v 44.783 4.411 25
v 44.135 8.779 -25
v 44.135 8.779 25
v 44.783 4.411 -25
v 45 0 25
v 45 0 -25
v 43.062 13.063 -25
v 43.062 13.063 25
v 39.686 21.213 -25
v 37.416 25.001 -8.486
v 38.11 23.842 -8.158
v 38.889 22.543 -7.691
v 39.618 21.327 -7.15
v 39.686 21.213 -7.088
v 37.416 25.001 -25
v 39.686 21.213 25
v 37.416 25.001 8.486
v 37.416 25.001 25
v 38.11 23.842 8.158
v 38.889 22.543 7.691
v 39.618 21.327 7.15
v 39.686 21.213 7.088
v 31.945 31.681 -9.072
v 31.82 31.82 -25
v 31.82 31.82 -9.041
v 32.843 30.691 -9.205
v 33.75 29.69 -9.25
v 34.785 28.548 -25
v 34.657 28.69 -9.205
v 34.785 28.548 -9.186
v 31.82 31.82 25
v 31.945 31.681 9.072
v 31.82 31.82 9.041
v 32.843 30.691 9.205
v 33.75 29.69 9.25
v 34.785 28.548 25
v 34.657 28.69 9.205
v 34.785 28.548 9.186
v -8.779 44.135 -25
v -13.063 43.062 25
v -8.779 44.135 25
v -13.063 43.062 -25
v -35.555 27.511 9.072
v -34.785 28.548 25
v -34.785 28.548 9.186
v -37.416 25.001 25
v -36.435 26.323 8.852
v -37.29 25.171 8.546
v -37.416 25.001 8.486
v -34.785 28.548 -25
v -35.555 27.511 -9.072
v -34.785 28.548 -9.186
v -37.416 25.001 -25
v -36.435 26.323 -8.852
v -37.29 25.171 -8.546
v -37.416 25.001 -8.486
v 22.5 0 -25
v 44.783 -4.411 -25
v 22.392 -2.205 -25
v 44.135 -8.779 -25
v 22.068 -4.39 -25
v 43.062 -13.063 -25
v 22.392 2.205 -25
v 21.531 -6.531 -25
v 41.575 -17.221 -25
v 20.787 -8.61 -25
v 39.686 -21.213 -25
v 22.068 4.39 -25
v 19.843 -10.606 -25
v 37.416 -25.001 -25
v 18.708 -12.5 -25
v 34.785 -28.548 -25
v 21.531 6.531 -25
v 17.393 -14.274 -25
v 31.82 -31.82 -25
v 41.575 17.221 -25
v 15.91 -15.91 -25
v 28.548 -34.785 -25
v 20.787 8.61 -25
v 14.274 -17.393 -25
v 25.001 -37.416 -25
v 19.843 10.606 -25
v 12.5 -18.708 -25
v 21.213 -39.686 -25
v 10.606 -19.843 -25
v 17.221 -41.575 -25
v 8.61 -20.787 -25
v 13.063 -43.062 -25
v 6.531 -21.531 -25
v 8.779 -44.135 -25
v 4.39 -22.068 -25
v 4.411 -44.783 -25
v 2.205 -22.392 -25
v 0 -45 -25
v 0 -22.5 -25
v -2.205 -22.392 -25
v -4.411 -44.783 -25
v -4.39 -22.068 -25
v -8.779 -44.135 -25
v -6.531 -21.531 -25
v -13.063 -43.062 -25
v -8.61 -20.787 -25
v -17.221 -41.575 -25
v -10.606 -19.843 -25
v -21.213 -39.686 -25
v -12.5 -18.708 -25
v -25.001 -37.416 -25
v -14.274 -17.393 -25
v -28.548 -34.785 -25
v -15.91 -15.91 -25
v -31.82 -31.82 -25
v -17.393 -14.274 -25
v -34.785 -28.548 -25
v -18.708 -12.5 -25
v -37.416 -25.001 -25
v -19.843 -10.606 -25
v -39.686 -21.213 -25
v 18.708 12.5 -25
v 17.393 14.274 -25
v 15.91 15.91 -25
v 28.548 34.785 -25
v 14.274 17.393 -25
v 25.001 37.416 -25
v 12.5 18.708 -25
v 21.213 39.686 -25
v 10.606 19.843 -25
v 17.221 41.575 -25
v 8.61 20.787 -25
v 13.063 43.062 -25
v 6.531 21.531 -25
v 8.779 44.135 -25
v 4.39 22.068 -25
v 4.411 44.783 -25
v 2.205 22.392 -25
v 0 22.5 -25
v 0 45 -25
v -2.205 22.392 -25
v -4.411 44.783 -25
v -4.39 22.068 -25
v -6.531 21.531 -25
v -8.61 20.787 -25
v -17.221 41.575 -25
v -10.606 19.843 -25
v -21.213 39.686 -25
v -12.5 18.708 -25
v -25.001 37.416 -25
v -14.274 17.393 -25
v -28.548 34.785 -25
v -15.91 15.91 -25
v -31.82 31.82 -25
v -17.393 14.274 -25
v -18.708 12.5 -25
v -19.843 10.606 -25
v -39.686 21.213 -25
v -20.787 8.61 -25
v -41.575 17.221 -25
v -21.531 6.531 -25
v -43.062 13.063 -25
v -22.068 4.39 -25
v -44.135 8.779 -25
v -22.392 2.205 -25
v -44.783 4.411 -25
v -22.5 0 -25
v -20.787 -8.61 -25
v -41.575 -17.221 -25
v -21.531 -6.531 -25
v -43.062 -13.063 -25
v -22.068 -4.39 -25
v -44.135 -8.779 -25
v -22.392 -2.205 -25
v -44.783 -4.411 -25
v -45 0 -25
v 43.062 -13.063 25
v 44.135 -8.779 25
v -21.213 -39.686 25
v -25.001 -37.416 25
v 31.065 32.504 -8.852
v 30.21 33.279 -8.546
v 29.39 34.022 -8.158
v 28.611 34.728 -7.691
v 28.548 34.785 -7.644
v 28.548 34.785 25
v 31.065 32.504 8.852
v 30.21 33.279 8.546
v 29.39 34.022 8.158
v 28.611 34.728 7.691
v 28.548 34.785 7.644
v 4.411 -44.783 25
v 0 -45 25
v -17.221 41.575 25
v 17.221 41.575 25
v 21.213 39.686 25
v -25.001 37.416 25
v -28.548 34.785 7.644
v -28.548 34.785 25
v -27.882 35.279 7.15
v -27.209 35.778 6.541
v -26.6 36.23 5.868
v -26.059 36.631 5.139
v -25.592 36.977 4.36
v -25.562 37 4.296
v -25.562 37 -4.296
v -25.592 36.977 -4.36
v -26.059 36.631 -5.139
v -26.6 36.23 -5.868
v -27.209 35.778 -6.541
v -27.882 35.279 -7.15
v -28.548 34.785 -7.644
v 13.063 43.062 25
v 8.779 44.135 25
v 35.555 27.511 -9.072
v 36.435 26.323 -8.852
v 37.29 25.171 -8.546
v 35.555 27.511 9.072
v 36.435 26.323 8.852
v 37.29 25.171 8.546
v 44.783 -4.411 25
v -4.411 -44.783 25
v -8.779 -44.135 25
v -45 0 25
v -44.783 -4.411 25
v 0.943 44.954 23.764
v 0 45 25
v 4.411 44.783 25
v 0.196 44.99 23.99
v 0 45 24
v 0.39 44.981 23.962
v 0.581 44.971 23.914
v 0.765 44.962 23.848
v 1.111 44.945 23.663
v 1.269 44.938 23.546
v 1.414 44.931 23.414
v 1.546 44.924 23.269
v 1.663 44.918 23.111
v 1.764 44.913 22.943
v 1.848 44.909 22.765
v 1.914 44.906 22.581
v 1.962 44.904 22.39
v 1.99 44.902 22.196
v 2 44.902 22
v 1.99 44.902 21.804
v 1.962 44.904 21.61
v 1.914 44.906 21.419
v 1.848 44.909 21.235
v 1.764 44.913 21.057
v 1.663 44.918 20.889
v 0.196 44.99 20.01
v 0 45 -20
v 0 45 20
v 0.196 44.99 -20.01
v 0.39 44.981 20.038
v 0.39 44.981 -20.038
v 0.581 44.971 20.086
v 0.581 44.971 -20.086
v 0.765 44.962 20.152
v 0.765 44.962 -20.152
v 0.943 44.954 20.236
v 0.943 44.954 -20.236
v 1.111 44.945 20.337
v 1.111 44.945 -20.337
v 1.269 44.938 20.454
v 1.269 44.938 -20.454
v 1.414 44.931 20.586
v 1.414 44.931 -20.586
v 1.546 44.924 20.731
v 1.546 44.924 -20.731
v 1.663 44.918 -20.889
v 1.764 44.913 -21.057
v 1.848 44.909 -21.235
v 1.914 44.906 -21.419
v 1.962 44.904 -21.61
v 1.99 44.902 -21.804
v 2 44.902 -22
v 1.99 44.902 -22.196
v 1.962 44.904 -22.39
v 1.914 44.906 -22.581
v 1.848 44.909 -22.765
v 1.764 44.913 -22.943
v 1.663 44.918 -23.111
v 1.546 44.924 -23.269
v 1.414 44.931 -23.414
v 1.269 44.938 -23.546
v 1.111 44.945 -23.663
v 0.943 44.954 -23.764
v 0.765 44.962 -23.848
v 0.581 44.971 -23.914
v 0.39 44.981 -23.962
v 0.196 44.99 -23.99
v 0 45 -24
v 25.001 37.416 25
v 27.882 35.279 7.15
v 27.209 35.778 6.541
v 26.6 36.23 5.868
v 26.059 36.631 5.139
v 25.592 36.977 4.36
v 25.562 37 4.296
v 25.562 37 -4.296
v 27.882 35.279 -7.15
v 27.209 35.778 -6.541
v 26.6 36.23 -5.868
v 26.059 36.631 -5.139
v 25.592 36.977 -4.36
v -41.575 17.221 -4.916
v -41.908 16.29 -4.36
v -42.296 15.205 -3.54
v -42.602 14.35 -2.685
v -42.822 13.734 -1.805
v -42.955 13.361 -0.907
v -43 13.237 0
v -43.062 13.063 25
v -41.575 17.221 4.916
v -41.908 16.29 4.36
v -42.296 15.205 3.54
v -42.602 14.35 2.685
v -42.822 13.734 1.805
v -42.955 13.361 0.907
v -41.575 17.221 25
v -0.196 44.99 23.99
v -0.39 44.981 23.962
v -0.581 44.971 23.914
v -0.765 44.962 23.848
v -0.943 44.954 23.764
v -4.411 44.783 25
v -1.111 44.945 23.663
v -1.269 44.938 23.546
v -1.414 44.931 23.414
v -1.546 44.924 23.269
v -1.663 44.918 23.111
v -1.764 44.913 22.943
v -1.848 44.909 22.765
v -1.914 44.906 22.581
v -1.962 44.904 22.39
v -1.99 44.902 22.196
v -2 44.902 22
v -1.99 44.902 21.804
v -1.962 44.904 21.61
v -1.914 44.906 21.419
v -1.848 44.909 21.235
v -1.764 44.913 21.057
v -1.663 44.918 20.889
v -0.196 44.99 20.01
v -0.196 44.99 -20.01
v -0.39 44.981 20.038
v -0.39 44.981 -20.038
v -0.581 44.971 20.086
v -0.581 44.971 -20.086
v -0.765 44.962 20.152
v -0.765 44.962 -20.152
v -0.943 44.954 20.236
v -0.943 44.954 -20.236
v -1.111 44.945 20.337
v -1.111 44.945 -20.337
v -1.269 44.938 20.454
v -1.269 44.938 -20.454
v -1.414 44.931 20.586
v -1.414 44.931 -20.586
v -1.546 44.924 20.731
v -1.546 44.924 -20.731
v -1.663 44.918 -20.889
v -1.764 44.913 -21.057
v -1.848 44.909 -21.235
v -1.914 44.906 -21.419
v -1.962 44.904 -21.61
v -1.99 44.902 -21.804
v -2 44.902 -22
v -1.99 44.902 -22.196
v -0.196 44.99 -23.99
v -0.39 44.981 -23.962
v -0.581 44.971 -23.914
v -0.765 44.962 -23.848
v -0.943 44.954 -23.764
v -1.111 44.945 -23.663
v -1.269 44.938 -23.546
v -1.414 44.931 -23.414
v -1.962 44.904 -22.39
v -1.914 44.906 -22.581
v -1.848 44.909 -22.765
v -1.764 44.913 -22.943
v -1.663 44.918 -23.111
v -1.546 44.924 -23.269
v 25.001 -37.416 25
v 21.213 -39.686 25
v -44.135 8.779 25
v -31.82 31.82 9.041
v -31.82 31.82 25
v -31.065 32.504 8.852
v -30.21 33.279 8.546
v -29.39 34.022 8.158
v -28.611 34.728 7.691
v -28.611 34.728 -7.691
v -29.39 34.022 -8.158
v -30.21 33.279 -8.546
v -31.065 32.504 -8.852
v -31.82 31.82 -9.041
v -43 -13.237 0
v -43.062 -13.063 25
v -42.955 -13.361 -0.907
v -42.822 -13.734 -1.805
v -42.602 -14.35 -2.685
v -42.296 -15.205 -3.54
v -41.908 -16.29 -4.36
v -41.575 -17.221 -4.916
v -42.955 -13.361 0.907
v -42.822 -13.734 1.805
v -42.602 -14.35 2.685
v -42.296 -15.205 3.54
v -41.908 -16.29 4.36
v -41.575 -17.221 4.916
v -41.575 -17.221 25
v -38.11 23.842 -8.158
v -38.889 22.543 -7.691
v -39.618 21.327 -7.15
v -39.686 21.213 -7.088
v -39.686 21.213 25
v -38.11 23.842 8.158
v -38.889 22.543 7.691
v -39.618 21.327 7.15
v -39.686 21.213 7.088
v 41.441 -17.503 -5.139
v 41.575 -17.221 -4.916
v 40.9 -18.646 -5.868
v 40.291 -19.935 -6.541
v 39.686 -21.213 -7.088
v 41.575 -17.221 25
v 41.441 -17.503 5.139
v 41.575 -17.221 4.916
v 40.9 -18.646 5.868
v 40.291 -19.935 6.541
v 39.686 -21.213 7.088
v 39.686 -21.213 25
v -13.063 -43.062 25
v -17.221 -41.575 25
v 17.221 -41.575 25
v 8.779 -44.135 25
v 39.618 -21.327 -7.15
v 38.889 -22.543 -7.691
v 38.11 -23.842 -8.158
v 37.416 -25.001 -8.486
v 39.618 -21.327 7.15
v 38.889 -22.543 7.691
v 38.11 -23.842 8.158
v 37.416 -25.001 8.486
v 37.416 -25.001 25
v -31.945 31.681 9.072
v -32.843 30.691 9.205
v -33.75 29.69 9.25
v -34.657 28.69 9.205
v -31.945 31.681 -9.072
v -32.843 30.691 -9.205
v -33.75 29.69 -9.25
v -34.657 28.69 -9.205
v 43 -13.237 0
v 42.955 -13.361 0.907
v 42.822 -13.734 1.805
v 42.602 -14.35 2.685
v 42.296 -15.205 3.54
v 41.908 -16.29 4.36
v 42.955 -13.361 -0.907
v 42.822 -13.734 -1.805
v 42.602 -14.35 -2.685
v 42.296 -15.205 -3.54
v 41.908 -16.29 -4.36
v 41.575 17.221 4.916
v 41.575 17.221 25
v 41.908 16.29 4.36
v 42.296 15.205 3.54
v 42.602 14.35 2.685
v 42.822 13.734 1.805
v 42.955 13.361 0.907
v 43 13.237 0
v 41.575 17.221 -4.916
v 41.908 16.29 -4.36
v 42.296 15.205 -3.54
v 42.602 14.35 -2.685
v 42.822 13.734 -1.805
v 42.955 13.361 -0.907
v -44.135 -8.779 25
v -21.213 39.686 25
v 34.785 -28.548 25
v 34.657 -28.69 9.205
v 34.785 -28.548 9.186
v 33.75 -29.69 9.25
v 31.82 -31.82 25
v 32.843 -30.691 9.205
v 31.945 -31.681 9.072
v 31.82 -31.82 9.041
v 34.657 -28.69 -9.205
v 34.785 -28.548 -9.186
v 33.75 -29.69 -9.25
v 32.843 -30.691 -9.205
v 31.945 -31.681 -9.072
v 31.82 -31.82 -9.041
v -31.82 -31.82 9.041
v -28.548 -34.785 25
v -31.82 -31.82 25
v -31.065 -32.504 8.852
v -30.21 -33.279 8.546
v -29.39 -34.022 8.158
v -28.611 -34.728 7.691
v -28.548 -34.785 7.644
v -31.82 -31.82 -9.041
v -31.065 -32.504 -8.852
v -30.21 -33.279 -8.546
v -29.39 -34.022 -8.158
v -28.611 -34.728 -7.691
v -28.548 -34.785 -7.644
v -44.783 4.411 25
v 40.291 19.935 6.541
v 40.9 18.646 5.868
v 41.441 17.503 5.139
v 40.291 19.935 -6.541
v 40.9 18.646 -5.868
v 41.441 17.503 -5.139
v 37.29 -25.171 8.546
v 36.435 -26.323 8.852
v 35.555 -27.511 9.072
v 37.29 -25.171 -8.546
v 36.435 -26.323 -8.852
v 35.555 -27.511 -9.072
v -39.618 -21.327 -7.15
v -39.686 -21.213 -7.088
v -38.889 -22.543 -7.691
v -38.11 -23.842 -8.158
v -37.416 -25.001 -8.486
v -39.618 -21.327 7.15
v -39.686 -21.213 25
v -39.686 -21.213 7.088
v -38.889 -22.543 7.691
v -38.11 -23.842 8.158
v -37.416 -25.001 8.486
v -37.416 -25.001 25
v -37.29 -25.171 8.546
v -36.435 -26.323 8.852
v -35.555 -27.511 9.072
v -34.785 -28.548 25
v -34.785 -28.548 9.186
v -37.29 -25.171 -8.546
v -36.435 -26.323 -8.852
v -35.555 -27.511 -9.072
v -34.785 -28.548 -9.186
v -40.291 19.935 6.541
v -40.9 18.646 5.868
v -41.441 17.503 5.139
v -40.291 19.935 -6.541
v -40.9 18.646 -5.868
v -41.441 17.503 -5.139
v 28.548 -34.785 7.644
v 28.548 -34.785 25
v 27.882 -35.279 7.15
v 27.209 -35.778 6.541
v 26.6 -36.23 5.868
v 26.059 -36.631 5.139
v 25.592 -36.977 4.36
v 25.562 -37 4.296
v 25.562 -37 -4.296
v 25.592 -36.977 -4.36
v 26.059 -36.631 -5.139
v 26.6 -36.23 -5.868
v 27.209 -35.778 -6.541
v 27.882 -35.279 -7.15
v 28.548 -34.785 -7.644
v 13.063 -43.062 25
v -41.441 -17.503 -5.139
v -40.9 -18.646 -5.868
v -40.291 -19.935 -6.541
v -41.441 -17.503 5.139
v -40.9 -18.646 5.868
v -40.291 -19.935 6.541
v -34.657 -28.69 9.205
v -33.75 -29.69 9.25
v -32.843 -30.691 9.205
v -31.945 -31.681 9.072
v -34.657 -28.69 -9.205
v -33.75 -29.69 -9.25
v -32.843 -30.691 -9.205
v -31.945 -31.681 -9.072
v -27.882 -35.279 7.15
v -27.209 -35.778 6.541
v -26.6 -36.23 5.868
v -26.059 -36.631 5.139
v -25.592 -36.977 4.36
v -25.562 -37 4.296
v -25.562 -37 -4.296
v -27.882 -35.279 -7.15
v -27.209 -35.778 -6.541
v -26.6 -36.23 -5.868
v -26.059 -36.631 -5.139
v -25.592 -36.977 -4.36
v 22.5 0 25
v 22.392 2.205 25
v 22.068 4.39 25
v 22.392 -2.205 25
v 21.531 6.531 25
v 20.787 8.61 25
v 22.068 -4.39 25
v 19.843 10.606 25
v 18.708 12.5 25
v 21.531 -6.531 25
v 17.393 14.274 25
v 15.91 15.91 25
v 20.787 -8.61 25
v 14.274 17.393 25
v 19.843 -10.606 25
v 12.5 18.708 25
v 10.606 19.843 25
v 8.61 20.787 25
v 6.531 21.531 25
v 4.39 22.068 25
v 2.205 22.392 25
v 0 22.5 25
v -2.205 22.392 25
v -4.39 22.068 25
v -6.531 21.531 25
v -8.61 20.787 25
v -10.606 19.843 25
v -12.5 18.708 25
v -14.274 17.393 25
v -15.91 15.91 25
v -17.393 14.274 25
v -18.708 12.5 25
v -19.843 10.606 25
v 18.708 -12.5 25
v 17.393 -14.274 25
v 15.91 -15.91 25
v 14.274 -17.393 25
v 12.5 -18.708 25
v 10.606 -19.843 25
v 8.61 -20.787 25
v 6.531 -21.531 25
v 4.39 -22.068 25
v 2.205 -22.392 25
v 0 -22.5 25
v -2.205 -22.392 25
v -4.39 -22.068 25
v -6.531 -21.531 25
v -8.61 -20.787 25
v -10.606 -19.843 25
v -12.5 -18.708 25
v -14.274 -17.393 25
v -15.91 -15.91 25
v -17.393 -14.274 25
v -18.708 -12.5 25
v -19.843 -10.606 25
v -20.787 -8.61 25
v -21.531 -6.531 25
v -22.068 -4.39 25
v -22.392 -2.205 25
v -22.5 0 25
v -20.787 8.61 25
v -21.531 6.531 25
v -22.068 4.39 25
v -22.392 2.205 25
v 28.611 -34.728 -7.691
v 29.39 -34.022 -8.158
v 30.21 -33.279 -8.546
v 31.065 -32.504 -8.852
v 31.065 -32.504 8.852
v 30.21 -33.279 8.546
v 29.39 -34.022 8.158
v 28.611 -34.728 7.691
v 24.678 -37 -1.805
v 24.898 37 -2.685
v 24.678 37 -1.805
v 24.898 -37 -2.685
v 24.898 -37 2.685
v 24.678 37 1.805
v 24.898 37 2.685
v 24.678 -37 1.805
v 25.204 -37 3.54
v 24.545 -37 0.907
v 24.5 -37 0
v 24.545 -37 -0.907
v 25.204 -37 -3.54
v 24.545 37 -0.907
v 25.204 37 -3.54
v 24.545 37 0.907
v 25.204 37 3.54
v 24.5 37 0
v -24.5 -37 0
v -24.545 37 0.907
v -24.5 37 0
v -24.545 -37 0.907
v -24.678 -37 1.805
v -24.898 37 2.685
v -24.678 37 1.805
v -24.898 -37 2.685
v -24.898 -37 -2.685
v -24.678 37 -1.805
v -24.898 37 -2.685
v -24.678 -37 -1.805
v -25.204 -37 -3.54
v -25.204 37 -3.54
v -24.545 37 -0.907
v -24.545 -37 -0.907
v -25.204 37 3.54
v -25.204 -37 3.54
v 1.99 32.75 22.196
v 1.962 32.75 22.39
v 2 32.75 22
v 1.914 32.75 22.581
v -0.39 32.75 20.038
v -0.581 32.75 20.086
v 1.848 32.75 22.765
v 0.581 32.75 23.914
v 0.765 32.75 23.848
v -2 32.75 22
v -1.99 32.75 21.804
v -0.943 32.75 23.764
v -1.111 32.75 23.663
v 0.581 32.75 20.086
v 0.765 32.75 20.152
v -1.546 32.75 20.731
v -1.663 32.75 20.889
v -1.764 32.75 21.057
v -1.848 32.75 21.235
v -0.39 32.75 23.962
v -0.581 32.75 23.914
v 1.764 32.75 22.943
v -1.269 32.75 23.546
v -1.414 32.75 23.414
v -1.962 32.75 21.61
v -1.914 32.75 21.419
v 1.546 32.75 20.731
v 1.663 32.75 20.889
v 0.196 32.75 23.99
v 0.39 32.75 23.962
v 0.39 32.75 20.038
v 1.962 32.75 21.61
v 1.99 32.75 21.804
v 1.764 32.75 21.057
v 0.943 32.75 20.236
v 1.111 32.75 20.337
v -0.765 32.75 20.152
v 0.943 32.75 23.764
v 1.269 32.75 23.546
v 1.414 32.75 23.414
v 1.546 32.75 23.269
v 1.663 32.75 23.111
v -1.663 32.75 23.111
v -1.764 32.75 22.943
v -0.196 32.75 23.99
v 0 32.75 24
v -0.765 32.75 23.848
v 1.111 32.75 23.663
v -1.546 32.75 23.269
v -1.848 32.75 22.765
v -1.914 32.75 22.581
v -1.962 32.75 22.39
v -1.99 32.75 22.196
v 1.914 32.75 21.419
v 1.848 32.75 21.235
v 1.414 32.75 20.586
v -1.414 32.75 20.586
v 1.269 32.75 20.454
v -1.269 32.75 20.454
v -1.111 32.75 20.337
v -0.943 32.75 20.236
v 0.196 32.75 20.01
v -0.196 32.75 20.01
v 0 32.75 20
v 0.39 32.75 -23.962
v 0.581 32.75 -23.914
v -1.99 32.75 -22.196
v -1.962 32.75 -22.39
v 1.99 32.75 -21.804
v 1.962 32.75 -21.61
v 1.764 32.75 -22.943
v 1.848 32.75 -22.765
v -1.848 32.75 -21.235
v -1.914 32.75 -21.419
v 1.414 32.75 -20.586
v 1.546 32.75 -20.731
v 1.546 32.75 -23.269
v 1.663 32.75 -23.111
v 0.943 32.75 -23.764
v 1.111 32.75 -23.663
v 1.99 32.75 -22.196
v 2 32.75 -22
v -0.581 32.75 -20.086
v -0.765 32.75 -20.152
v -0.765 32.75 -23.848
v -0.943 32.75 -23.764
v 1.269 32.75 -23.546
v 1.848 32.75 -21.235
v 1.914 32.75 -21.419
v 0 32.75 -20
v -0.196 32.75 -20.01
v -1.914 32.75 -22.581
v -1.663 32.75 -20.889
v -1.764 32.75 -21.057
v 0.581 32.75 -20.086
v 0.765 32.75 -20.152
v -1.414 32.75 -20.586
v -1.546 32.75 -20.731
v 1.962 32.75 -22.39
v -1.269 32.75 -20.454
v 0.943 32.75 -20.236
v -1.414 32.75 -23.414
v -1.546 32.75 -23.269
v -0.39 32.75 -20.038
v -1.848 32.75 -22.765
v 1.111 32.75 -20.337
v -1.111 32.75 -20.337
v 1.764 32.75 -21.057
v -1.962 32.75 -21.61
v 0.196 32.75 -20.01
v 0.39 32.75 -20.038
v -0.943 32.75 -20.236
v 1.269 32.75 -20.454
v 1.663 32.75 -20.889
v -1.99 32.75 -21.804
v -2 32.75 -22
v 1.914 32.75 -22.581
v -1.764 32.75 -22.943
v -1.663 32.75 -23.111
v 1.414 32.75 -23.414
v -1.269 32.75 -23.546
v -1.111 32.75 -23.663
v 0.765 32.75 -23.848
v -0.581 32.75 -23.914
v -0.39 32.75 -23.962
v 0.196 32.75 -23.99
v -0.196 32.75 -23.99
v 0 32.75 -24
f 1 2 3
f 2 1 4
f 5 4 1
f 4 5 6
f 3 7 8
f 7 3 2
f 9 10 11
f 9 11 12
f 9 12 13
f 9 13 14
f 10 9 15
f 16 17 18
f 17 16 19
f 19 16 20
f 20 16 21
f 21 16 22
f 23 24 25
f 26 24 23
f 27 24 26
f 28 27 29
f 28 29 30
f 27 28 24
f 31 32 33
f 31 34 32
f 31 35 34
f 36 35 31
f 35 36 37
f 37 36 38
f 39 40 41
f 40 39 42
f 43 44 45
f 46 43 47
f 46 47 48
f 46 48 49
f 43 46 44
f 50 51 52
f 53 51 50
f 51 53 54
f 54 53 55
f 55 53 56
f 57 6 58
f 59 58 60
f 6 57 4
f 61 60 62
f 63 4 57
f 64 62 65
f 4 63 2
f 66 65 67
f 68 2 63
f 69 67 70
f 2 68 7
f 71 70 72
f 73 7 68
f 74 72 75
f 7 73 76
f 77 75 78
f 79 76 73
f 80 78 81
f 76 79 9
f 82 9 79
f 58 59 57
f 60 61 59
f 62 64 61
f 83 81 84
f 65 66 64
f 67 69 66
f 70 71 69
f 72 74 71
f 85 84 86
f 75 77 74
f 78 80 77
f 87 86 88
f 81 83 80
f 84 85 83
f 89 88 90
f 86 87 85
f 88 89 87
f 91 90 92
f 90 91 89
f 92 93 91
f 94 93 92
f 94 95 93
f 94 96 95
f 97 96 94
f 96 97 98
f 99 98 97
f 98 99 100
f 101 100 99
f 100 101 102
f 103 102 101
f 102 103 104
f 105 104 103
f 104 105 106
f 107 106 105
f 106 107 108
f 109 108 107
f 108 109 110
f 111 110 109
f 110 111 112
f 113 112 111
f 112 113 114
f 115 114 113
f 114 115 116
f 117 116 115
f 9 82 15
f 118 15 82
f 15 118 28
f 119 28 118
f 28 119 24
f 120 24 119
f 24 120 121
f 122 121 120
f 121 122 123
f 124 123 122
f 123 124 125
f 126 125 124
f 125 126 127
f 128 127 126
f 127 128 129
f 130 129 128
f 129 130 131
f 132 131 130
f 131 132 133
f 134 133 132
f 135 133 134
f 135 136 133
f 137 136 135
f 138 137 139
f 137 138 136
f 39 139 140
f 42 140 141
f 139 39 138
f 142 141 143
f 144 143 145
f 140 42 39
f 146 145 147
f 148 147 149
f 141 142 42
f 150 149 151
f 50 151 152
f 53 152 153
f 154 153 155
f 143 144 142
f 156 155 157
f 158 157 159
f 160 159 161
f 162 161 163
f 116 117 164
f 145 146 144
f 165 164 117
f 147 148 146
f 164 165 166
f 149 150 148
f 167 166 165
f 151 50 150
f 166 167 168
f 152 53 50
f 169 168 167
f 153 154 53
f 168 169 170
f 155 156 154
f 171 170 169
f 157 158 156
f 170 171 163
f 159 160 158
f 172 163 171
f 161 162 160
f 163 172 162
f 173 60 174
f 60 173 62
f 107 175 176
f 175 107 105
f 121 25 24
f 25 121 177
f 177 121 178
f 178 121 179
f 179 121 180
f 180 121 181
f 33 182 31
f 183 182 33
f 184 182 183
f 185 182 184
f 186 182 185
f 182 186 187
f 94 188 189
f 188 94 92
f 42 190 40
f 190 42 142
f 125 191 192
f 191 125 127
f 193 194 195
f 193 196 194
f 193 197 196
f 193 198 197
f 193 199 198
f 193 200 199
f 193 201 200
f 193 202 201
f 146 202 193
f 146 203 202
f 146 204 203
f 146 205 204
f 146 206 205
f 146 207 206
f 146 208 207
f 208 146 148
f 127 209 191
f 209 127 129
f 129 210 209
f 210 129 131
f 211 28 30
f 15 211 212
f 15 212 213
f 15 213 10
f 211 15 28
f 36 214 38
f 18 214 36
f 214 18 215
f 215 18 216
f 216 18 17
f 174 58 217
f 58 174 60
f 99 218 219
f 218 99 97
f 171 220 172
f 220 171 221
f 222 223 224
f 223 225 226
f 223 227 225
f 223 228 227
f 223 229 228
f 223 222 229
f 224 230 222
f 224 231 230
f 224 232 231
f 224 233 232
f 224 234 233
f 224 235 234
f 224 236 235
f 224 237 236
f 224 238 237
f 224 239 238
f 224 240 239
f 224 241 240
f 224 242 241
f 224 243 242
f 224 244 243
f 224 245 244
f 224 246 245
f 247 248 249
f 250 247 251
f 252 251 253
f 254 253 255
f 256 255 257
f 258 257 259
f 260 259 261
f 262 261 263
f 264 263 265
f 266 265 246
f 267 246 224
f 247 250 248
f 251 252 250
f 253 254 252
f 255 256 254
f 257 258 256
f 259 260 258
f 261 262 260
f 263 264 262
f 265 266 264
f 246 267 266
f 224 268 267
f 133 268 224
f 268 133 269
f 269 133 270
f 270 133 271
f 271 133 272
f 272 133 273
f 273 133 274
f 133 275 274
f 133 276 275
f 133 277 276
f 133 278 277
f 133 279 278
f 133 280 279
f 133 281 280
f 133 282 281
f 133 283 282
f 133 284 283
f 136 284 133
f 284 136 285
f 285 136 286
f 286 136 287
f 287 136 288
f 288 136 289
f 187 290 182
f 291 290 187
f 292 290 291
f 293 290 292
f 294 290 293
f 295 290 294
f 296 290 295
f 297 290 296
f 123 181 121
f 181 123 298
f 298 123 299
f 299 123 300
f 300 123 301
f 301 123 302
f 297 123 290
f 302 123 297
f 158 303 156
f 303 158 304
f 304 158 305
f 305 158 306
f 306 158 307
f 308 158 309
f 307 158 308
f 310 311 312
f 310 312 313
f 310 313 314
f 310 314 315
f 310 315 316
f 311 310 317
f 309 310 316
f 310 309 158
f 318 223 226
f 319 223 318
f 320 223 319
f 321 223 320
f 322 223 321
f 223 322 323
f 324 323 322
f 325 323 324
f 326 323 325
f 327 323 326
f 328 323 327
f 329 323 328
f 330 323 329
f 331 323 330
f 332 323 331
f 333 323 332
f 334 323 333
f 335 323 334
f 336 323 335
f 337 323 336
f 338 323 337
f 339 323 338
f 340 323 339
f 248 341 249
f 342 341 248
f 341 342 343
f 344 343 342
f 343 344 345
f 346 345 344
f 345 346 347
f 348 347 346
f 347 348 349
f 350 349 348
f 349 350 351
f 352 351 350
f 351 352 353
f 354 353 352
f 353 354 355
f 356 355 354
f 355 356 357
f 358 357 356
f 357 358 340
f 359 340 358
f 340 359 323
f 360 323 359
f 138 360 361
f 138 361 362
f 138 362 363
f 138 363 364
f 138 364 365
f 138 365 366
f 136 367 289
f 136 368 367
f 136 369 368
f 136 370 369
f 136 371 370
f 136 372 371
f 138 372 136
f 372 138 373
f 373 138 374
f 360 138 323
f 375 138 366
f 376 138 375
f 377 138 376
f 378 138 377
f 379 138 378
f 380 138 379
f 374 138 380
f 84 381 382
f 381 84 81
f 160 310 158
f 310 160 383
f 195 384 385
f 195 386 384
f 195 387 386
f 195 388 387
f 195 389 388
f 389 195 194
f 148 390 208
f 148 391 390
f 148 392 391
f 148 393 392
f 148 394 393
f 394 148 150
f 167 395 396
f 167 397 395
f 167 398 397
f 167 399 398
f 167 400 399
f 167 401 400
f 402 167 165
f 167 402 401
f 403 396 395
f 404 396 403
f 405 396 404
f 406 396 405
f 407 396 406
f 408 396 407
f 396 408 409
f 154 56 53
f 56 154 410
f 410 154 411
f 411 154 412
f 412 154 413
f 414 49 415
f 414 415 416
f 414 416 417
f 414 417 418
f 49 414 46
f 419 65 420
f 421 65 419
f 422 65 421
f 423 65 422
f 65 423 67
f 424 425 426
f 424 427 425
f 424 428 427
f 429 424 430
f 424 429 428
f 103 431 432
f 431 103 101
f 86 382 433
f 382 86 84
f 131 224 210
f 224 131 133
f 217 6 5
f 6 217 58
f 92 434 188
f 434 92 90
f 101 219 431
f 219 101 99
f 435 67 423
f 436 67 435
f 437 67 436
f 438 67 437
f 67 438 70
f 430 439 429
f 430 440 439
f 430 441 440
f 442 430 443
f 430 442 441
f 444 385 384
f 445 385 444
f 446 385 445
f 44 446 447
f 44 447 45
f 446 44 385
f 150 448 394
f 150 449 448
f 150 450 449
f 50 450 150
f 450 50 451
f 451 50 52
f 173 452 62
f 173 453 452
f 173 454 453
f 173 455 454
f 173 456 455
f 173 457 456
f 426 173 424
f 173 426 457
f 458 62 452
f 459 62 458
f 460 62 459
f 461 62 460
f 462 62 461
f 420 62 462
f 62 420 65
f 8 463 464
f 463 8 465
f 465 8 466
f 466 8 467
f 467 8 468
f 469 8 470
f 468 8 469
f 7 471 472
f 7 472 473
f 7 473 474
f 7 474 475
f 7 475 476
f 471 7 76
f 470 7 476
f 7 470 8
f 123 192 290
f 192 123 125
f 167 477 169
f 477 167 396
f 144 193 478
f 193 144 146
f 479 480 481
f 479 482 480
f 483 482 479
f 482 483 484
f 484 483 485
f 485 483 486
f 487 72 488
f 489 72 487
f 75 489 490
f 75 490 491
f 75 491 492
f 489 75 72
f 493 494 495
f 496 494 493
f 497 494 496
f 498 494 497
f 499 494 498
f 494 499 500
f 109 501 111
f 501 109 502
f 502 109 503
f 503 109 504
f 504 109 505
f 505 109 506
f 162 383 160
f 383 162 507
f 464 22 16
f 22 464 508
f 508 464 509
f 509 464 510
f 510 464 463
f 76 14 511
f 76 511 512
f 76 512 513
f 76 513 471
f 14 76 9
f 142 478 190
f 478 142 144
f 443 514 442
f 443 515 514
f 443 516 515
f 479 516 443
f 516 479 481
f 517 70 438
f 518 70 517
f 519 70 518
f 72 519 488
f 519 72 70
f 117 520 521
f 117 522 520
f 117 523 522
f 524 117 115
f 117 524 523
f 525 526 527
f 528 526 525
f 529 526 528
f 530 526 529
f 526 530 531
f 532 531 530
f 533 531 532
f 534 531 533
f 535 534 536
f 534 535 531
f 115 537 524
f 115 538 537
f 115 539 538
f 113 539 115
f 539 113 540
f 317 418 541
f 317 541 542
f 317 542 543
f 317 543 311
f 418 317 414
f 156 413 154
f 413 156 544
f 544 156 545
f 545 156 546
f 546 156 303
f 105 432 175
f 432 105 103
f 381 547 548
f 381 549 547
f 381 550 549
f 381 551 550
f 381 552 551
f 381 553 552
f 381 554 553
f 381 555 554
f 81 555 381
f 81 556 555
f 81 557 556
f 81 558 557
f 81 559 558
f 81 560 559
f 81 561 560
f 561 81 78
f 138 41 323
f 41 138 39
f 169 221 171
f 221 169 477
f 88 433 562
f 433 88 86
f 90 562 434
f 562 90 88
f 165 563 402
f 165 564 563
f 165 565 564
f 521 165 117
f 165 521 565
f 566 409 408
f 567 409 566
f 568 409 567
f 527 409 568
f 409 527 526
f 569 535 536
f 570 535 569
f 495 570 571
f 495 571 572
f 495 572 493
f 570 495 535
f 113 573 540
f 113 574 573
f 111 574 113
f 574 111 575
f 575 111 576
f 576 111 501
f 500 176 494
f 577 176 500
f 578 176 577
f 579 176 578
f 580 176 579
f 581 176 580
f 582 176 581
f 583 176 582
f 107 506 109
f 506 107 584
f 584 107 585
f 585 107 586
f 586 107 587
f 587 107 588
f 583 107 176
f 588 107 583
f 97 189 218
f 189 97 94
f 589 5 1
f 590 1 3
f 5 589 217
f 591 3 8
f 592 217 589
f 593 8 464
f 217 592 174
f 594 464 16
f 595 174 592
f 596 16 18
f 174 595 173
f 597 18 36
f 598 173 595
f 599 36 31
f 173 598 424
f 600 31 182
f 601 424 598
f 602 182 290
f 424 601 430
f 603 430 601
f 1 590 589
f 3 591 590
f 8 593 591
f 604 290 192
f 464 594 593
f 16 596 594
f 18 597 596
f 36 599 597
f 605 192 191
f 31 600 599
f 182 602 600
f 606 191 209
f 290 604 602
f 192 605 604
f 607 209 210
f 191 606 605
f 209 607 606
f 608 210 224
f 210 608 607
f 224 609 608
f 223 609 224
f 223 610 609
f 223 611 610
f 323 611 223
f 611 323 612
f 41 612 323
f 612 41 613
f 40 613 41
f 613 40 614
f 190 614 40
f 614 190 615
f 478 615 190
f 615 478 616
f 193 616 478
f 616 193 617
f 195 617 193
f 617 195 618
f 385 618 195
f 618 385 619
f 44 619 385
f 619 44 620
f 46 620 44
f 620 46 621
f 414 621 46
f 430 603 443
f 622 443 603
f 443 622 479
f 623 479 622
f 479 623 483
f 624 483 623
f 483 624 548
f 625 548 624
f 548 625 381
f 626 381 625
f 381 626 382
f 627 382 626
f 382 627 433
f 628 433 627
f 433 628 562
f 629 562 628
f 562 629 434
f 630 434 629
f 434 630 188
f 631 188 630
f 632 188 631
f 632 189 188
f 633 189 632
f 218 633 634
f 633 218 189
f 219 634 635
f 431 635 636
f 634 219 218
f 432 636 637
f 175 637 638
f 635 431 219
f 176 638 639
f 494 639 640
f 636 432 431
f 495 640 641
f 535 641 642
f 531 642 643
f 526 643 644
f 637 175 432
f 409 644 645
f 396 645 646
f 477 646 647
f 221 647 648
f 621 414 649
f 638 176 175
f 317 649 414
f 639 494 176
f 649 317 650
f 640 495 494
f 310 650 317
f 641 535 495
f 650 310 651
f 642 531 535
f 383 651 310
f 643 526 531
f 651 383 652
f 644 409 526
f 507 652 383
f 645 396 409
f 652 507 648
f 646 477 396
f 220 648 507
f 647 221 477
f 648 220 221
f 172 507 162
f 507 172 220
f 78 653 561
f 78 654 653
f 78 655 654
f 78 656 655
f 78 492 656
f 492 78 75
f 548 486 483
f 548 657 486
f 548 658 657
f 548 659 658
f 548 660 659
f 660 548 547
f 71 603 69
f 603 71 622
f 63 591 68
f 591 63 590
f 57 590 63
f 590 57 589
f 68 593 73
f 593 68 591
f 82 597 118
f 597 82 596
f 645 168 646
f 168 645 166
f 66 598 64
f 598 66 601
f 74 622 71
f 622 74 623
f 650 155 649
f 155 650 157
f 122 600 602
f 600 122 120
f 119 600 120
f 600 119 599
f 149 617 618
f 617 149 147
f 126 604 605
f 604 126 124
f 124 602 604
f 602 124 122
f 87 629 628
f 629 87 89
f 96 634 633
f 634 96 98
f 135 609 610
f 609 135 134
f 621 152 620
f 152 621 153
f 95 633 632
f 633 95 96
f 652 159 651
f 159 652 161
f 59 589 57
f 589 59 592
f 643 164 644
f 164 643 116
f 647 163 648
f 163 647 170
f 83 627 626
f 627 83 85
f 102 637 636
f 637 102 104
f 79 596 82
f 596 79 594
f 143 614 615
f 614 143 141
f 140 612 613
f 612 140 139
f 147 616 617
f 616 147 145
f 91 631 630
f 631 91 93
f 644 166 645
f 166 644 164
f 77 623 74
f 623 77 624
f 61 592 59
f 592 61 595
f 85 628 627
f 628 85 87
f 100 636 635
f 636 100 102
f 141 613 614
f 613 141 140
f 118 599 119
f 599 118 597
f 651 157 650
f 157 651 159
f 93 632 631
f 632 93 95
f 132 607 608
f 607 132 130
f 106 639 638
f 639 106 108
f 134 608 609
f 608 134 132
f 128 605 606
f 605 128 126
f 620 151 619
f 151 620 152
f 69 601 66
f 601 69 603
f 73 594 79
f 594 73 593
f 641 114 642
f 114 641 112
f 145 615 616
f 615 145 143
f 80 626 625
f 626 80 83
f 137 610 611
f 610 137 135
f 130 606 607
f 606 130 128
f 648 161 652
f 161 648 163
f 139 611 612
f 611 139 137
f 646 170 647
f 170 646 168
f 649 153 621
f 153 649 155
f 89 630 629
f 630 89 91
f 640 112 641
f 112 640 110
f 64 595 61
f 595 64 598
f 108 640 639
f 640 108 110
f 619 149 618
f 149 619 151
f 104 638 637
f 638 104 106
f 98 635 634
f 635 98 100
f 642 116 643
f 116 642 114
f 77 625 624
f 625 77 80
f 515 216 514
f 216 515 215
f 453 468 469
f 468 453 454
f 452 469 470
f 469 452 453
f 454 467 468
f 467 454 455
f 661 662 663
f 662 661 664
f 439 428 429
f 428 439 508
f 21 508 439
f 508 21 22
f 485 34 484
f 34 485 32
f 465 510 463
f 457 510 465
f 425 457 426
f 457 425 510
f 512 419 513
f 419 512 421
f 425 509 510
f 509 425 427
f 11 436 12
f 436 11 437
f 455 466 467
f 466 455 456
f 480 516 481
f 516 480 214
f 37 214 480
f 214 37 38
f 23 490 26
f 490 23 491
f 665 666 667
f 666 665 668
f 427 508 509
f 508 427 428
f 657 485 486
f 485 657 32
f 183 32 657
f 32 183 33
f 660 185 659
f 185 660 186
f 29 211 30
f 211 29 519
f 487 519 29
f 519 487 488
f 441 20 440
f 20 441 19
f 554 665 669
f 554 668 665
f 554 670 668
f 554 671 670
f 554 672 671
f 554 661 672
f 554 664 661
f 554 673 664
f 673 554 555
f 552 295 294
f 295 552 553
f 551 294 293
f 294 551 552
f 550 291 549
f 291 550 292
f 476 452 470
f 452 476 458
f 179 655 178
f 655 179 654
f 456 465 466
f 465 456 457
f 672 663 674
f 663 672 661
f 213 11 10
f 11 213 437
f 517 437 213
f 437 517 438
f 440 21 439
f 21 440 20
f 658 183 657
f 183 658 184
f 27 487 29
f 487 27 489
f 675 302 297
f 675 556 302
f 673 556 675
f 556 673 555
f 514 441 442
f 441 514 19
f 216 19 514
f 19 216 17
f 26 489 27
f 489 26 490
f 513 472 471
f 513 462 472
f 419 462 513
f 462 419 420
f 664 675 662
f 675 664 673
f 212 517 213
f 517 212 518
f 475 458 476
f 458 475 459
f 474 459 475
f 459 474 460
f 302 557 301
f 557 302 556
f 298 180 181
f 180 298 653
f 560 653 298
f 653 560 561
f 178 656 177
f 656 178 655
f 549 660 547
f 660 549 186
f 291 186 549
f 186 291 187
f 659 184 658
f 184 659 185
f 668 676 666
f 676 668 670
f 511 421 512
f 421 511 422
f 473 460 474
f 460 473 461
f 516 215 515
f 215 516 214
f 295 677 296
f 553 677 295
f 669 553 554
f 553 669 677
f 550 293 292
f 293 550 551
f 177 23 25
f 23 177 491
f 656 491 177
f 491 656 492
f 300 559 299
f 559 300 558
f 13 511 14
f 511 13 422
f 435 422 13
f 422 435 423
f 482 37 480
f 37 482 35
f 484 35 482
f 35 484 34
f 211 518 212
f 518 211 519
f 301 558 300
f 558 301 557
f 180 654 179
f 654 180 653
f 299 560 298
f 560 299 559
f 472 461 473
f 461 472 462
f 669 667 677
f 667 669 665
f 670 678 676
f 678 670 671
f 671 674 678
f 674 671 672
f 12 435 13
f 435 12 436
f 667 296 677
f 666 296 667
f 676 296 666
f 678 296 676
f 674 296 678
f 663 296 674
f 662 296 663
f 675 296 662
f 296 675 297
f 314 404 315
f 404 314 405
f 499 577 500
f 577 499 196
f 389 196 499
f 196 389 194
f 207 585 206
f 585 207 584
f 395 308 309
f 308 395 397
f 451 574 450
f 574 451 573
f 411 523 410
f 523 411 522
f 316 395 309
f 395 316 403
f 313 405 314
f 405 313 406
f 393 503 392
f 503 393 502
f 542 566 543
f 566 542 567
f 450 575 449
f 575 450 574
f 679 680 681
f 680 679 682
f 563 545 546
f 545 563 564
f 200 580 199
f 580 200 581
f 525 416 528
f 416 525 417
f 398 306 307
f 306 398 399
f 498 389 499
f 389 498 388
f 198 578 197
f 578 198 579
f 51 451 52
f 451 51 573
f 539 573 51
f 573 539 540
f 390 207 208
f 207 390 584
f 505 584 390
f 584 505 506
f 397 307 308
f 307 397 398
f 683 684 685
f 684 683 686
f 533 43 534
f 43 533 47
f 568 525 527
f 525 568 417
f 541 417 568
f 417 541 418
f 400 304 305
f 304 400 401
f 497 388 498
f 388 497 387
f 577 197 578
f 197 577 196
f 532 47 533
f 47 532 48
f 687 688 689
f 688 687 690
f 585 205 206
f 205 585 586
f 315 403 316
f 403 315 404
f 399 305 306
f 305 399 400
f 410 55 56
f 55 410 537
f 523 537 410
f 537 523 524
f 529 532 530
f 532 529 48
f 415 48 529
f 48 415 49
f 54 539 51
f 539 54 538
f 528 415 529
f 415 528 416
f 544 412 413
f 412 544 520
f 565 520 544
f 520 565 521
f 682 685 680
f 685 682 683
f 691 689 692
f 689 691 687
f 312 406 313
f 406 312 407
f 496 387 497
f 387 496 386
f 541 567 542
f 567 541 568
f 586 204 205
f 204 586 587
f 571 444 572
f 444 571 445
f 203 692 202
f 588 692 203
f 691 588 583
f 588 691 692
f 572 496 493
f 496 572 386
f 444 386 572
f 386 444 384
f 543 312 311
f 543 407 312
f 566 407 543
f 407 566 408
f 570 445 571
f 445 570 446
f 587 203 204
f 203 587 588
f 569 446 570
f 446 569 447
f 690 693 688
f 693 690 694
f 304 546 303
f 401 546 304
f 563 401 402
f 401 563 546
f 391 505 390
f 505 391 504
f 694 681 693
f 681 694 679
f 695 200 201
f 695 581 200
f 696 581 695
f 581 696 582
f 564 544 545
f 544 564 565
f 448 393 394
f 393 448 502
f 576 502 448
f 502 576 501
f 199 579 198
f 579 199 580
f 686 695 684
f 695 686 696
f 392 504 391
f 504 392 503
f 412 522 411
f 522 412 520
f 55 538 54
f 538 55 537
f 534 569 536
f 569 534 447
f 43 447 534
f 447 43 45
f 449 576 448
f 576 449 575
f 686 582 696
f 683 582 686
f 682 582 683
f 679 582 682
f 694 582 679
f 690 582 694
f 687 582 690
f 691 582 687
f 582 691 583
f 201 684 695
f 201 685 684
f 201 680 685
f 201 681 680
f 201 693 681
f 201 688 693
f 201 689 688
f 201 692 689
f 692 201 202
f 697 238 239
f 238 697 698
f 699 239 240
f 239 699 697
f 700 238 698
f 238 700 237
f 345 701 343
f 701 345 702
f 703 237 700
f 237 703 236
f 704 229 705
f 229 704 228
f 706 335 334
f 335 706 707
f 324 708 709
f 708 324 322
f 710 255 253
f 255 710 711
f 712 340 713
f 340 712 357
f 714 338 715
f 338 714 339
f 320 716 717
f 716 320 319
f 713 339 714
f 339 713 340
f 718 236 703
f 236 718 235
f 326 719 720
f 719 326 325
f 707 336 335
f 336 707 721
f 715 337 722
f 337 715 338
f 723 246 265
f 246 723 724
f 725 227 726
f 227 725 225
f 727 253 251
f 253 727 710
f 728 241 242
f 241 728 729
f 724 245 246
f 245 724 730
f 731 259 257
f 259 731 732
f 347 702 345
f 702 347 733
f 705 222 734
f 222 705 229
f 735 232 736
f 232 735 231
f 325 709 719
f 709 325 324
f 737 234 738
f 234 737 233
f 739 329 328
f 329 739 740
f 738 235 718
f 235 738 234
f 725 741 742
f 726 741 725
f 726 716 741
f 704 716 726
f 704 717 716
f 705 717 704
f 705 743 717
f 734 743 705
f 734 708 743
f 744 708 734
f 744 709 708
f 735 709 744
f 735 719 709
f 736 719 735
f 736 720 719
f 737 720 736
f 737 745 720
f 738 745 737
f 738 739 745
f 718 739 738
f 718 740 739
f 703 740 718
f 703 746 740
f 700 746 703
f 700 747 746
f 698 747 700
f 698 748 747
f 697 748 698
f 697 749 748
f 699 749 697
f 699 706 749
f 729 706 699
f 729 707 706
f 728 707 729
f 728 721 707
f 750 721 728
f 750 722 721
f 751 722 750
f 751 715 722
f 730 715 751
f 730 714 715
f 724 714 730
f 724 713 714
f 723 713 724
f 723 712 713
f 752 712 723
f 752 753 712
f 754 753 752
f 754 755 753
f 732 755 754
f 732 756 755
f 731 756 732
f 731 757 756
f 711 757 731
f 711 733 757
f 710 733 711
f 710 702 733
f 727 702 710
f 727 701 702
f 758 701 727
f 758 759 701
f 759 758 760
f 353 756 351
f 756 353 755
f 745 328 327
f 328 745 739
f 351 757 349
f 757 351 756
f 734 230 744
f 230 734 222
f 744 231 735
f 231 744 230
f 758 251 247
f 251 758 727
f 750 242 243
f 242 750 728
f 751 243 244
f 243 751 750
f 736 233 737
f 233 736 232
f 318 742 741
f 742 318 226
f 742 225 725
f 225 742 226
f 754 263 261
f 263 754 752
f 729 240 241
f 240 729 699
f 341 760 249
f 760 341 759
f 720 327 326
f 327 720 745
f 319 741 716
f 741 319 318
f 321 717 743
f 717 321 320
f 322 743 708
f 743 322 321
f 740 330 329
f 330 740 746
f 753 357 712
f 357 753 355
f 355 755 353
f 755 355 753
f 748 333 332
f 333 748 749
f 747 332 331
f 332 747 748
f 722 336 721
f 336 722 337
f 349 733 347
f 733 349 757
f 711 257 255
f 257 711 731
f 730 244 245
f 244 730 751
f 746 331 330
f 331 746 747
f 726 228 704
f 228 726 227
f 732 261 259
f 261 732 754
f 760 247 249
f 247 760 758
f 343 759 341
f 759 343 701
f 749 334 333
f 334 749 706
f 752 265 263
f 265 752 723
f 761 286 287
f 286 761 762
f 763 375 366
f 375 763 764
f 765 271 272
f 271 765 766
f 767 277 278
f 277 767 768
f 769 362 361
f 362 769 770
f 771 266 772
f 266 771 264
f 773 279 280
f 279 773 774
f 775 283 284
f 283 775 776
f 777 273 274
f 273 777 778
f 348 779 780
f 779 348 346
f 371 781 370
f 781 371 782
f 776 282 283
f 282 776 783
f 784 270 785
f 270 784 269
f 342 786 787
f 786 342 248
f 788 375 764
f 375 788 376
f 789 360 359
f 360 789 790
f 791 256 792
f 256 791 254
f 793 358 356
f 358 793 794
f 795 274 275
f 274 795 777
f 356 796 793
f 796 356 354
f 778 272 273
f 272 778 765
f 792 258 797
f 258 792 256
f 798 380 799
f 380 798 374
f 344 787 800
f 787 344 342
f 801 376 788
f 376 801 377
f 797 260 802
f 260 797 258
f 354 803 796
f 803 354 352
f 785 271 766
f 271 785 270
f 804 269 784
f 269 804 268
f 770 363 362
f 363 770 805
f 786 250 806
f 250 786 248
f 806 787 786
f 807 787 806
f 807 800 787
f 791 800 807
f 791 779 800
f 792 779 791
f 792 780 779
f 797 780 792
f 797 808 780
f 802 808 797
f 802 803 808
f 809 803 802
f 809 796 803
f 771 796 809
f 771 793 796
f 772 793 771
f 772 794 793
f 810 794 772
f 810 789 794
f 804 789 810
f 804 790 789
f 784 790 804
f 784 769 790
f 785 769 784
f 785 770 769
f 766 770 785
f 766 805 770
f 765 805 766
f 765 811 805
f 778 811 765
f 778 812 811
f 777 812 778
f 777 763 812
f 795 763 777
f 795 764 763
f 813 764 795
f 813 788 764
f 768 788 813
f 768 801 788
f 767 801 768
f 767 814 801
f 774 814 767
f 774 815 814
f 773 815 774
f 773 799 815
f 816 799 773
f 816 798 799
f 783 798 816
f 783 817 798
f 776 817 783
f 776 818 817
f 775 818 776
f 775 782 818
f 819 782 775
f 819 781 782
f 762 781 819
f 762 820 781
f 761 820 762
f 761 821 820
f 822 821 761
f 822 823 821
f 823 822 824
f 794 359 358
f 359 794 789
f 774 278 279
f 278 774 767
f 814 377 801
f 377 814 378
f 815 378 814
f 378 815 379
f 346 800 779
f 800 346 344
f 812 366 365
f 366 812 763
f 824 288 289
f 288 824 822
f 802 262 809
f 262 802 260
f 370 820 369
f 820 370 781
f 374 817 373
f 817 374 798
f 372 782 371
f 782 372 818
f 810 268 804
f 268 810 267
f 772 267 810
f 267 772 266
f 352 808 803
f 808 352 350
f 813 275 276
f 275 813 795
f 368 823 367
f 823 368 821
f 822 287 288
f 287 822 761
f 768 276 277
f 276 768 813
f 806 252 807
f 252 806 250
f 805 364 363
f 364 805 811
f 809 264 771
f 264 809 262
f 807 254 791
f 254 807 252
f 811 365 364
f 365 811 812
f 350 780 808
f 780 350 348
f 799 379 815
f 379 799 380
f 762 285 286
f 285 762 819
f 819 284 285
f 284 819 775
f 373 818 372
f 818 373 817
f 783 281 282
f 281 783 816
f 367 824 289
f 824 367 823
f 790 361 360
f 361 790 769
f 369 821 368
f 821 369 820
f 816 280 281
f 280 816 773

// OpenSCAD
// COBRA Vertebra - L4 V22
// Height: 50.0mm, OD: 90.0mm

$fn = 64;

difference() {
    // Outer cylinder
    cylinder(h=50.0, d=90.0, center=true);
    
    // Inner channel
    cylinder(h=52.0, d=45.0, center=true);

    // Battery cavity 1
    rotate([0, 0, 0])
    translate([33.75, 0, 0])
    rotate([90, 0, 0])
    cylinder(h=74.0, d=18.5, center=true);

    // Battery cavity 2
    rotate([0, 0, 180])
    translate([33.75, 0, 0])
    rotate([90, 0, 0])
    cylinder(h=74.0, d=18.5, center=true);

    // Pivot holes
    translate([0, 45.0, 22.0])
    rotate([90, 0, 0])
    cylinder(h=24.5, d=4, center=true);
    
    translate([0, 45.0, -22.0])
    rotate([90, 0, 0])
    cylinder(h=24.5, d=4, center=true);
}
